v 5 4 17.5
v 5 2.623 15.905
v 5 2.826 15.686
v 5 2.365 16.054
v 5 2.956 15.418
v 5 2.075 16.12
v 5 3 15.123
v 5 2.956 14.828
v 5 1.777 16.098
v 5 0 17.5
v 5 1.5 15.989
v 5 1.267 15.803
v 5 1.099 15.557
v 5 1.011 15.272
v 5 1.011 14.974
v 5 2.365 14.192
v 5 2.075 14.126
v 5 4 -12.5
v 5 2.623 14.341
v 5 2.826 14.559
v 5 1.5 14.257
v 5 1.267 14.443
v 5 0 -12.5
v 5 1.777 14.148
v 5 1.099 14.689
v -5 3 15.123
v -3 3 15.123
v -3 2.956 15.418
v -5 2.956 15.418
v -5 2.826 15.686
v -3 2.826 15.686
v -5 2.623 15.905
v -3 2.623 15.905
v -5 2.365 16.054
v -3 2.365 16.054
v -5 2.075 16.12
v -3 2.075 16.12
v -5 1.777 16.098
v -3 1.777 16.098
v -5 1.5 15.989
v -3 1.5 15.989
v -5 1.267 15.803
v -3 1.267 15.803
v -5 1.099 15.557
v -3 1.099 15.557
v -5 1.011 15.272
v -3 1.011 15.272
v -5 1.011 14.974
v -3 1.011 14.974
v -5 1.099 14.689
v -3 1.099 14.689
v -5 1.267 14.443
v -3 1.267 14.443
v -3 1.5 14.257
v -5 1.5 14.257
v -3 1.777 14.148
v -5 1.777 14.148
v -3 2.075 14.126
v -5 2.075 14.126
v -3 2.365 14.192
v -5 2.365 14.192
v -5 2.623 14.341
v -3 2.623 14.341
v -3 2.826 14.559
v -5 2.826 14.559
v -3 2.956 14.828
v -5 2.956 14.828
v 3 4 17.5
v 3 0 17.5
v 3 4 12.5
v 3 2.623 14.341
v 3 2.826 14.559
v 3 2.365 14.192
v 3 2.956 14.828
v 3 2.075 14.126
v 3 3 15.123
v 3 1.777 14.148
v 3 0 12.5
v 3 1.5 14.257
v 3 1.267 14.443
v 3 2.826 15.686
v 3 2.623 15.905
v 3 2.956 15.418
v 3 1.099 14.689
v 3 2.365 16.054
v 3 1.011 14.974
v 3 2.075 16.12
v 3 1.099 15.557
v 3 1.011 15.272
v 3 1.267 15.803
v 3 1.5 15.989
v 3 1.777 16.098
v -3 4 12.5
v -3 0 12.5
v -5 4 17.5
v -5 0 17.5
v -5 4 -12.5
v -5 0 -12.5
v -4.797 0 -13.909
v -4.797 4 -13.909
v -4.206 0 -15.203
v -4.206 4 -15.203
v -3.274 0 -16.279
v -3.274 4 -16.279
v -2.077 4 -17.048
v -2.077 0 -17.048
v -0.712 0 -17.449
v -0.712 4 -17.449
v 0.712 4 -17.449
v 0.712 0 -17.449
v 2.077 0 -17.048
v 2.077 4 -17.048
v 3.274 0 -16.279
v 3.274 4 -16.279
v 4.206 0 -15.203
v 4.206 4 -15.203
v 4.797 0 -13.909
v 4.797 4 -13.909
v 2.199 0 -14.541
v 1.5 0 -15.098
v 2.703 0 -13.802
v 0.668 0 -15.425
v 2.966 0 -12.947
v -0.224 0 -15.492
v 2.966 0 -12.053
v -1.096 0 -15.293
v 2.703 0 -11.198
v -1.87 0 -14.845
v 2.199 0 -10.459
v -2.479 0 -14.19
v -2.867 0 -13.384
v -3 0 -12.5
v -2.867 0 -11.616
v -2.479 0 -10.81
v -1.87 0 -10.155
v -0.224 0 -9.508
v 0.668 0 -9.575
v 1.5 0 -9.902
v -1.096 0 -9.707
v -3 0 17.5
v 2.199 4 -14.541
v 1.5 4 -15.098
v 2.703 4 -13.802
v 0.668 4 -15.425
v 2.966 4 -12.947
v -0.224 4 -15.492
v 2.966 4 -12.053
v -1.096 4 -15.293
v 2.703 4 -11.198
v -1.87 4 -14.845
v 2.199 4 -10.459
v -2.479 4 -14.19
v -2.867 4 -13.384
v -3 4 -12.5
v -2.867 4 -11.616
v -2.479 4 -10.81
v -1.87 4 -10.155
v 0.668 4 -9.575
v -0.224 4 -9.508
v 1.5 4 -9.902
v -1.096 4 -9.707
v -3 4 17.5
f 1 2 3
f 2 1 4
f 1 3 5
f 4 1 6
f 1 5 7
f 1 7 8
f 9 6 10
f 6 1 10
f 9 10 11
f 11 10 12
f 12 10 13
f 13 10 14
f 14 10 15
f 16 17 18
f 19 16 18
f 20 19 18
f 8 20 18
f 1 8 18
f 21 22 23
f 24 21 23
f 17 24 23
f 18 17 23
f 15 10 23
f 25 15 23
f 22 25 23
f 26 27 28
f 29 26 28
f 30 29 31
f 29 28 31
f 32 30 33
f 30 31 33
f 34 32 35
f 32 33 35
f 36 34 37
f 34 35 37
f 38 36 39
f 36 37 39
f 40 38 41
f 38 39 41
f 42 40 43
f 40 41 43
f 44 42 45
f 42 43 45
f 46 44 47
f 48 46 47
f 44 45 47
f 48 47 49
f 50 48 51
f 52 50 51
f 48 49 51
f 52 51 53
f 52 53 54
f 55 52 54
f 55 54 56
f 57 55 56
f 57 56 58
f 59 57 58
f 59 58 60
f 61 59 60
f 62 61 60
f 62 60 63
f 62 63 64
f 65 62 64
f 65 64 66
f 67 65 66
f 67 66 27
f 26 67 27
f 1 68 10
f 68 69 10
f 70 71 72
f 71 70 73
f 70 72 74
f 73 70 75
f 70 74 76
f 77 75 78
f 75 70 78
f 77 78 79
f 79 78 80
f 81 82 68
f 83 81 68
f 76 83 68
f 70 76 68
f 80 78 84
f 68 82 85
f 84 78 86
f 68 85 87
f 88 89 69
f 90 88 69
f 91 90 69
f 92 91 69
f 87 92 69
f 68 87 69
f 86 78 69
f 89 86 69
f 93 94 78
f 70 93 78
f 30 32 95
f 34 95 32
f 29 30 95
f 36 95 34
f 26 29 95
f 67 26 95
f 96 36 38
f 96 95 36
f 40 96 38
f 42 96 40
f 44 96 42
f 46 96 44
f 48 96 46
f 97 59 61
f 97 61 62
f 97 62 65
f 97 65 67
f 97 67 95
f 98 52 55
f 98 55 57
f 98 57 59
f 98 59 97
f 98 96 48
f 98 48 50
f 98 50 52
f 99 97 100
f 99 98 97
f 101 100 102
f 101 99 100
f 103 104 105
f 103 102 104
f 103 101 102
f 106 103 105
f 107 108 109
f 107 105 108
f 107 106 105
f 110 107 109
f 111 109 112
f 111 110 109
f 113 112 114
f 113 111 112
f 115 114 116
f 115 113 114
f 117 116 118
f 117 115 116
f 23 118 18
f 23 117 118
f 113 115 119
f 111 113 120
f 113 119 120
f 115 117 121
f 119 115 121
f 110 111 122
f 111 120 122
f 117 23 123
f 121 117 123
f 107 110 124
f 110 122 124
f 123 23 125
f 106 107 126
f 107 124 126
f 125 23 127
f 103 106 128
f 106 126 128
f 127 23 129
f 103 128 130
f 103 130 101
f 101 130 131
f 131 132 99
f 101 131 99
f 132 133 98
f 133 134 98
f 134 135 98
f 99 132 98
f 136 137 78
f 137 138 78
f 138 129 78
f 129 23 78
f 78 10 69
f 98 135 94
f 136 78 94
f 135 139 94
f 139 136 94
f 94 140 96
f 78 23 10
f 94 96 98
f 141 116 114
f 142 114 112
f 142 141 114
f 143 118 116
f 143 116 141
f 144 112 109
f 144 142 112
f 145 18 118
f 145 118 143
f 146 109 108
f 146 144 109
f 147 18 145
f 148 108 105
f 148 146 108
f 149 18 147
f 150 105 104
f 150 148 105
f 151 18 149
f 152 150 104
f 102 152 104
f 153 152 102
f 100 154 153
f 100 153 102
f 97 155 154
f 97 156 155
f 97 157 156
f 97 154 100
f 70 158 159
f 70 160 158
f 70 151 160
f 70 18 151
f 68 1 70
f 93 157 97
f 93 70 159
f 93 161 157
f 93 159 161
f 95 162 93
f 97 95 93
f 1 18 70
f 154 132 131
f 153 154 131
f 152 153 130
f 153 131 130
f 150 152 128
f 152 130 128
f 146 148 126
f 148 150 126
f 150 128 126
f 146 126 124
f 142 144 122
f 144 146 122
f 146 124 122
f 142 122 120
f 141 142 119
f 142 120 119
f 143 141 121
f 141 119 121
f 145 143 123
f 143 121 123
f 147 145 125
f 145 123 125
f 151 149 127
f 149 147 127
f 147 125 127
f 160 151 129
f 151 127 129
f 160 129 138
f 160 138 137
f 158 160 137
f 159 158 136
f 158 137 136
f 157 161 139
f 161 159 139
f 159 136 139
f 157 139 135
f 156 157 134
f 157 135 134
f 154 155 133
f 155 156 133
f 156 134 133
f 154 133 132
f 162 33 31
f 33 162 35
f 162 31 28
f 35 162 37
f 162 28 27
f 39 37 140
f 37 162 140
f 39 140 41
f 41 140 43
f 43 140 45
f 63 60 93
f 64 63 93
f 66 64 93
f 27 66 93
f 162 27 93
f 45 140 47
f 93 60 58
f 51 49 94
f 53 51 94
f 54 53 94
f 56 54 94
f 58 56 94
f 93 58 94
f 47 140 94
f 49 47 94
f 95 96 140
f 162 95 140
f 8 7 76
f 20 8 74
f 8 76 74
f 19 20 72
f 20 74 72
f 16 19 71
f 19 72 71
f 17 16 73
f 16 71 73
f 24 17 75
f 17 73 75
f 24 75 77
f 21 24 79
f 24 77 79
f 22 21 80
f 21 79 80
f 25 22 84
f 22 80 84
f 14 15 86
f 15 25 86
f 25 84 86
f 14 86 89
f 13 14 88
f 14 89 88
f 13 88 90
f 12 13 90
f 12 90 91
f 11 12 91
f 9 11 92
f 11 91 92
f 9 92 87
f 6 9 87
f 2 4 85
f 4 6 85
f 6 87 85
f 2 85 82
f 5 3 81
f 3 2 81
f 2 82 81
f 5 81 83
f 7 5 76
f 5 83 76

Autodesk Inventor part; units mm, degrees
ref_plane "YZ Plane" through (0, 0, 0) normal (1, 0, 0) x (0, 1, 0)
ref_plane "XZ Plane" through (0, 0, 0) normal (0, 1, 0) x (-1, 0, 0)
ref_plane "XY Plane" through (0, 0, 0) normal (0, 0, 1) x (1, 0, 0)
sketch "スケッチ1" plane through (0, 0, 0) normal (0, 1, 0) x (-1, 0, 0)
  line L0 (-5, 17.5) -> (5, -17.5) construction
  line L1 (5, 17.5) -> (-5, -17.5) construction
  arc A0 (-5, -12.5) -> (5, -12.5) centre (0, -12.5) ccw
  line L2 (5, 17.5) -> (-5, 17.5)
  line L3 (5, 17.5) -> (5, -12.5)
  line L4 (-5, 17.5) -> (-5, -12.5)
  point P0 (0, 0)
  dimension "d0" = 10
  dimension "d1" = 35
extrude "押し出し1" add sketch "スケッチ1" along normal blind 4
sketch "スケッチ2" plane through (0, 0, 0) normal (0, 1, 0) x (-1, 0, 0)
  arc A0 (-5, -12.5) -> (5, -12.5) centre (0, -12.5) ccw projected
  circle A1 centre (0, -12.5) radius 3
  point P0 (0, 0)
  dimension "d7" = 6
extrude "押し出し2" cut sketch "スケッチ2" along normal blind 4
sketch "スケッチ3" plane through (0, 0, 0) normal (0, 1, 0) x (-1, 0, 0)
  line L0 (-5, 17.5) -> (5, 17.5) projected
  line L1 (3, 17.5) -> (3, 12.5)
  line L2 (3, 17.5) -> (8, 17.5) construction
  line L3 (3, 12.5) -> (-3, 12.5)
  line L4 (3, 12.5) -> (9, 12.5) construction
  line L5 (-3, 12.5) -> (-3, 17.5)
  line L6 (-3, 17.5) -> (3, 17.5)
  point P0 (0, 0)
  dimension "d10" = 5
  dimension "d11" = 270
  dimension "d12" = 6
  dimension "d13" = 180
extrude "押し出し3" cut sketch "スケッチ3" along normal blind 4
sketch "スケッチ4" plane through (0, 0, 0) normal (1, 0, 0) x (0, 1, 0)
  circle A0 centre (2, 15.1228) radius 1
  line L0 (0, -12.5) -> (0, 17.5) projected
  point P0 (0, 0)
  dimension "d16" = 2
  dimension "d18" = 2
extrude "押し出し4" cut sketch "スケッチ4" along normal mid plane 10
properties part number "promo2"
